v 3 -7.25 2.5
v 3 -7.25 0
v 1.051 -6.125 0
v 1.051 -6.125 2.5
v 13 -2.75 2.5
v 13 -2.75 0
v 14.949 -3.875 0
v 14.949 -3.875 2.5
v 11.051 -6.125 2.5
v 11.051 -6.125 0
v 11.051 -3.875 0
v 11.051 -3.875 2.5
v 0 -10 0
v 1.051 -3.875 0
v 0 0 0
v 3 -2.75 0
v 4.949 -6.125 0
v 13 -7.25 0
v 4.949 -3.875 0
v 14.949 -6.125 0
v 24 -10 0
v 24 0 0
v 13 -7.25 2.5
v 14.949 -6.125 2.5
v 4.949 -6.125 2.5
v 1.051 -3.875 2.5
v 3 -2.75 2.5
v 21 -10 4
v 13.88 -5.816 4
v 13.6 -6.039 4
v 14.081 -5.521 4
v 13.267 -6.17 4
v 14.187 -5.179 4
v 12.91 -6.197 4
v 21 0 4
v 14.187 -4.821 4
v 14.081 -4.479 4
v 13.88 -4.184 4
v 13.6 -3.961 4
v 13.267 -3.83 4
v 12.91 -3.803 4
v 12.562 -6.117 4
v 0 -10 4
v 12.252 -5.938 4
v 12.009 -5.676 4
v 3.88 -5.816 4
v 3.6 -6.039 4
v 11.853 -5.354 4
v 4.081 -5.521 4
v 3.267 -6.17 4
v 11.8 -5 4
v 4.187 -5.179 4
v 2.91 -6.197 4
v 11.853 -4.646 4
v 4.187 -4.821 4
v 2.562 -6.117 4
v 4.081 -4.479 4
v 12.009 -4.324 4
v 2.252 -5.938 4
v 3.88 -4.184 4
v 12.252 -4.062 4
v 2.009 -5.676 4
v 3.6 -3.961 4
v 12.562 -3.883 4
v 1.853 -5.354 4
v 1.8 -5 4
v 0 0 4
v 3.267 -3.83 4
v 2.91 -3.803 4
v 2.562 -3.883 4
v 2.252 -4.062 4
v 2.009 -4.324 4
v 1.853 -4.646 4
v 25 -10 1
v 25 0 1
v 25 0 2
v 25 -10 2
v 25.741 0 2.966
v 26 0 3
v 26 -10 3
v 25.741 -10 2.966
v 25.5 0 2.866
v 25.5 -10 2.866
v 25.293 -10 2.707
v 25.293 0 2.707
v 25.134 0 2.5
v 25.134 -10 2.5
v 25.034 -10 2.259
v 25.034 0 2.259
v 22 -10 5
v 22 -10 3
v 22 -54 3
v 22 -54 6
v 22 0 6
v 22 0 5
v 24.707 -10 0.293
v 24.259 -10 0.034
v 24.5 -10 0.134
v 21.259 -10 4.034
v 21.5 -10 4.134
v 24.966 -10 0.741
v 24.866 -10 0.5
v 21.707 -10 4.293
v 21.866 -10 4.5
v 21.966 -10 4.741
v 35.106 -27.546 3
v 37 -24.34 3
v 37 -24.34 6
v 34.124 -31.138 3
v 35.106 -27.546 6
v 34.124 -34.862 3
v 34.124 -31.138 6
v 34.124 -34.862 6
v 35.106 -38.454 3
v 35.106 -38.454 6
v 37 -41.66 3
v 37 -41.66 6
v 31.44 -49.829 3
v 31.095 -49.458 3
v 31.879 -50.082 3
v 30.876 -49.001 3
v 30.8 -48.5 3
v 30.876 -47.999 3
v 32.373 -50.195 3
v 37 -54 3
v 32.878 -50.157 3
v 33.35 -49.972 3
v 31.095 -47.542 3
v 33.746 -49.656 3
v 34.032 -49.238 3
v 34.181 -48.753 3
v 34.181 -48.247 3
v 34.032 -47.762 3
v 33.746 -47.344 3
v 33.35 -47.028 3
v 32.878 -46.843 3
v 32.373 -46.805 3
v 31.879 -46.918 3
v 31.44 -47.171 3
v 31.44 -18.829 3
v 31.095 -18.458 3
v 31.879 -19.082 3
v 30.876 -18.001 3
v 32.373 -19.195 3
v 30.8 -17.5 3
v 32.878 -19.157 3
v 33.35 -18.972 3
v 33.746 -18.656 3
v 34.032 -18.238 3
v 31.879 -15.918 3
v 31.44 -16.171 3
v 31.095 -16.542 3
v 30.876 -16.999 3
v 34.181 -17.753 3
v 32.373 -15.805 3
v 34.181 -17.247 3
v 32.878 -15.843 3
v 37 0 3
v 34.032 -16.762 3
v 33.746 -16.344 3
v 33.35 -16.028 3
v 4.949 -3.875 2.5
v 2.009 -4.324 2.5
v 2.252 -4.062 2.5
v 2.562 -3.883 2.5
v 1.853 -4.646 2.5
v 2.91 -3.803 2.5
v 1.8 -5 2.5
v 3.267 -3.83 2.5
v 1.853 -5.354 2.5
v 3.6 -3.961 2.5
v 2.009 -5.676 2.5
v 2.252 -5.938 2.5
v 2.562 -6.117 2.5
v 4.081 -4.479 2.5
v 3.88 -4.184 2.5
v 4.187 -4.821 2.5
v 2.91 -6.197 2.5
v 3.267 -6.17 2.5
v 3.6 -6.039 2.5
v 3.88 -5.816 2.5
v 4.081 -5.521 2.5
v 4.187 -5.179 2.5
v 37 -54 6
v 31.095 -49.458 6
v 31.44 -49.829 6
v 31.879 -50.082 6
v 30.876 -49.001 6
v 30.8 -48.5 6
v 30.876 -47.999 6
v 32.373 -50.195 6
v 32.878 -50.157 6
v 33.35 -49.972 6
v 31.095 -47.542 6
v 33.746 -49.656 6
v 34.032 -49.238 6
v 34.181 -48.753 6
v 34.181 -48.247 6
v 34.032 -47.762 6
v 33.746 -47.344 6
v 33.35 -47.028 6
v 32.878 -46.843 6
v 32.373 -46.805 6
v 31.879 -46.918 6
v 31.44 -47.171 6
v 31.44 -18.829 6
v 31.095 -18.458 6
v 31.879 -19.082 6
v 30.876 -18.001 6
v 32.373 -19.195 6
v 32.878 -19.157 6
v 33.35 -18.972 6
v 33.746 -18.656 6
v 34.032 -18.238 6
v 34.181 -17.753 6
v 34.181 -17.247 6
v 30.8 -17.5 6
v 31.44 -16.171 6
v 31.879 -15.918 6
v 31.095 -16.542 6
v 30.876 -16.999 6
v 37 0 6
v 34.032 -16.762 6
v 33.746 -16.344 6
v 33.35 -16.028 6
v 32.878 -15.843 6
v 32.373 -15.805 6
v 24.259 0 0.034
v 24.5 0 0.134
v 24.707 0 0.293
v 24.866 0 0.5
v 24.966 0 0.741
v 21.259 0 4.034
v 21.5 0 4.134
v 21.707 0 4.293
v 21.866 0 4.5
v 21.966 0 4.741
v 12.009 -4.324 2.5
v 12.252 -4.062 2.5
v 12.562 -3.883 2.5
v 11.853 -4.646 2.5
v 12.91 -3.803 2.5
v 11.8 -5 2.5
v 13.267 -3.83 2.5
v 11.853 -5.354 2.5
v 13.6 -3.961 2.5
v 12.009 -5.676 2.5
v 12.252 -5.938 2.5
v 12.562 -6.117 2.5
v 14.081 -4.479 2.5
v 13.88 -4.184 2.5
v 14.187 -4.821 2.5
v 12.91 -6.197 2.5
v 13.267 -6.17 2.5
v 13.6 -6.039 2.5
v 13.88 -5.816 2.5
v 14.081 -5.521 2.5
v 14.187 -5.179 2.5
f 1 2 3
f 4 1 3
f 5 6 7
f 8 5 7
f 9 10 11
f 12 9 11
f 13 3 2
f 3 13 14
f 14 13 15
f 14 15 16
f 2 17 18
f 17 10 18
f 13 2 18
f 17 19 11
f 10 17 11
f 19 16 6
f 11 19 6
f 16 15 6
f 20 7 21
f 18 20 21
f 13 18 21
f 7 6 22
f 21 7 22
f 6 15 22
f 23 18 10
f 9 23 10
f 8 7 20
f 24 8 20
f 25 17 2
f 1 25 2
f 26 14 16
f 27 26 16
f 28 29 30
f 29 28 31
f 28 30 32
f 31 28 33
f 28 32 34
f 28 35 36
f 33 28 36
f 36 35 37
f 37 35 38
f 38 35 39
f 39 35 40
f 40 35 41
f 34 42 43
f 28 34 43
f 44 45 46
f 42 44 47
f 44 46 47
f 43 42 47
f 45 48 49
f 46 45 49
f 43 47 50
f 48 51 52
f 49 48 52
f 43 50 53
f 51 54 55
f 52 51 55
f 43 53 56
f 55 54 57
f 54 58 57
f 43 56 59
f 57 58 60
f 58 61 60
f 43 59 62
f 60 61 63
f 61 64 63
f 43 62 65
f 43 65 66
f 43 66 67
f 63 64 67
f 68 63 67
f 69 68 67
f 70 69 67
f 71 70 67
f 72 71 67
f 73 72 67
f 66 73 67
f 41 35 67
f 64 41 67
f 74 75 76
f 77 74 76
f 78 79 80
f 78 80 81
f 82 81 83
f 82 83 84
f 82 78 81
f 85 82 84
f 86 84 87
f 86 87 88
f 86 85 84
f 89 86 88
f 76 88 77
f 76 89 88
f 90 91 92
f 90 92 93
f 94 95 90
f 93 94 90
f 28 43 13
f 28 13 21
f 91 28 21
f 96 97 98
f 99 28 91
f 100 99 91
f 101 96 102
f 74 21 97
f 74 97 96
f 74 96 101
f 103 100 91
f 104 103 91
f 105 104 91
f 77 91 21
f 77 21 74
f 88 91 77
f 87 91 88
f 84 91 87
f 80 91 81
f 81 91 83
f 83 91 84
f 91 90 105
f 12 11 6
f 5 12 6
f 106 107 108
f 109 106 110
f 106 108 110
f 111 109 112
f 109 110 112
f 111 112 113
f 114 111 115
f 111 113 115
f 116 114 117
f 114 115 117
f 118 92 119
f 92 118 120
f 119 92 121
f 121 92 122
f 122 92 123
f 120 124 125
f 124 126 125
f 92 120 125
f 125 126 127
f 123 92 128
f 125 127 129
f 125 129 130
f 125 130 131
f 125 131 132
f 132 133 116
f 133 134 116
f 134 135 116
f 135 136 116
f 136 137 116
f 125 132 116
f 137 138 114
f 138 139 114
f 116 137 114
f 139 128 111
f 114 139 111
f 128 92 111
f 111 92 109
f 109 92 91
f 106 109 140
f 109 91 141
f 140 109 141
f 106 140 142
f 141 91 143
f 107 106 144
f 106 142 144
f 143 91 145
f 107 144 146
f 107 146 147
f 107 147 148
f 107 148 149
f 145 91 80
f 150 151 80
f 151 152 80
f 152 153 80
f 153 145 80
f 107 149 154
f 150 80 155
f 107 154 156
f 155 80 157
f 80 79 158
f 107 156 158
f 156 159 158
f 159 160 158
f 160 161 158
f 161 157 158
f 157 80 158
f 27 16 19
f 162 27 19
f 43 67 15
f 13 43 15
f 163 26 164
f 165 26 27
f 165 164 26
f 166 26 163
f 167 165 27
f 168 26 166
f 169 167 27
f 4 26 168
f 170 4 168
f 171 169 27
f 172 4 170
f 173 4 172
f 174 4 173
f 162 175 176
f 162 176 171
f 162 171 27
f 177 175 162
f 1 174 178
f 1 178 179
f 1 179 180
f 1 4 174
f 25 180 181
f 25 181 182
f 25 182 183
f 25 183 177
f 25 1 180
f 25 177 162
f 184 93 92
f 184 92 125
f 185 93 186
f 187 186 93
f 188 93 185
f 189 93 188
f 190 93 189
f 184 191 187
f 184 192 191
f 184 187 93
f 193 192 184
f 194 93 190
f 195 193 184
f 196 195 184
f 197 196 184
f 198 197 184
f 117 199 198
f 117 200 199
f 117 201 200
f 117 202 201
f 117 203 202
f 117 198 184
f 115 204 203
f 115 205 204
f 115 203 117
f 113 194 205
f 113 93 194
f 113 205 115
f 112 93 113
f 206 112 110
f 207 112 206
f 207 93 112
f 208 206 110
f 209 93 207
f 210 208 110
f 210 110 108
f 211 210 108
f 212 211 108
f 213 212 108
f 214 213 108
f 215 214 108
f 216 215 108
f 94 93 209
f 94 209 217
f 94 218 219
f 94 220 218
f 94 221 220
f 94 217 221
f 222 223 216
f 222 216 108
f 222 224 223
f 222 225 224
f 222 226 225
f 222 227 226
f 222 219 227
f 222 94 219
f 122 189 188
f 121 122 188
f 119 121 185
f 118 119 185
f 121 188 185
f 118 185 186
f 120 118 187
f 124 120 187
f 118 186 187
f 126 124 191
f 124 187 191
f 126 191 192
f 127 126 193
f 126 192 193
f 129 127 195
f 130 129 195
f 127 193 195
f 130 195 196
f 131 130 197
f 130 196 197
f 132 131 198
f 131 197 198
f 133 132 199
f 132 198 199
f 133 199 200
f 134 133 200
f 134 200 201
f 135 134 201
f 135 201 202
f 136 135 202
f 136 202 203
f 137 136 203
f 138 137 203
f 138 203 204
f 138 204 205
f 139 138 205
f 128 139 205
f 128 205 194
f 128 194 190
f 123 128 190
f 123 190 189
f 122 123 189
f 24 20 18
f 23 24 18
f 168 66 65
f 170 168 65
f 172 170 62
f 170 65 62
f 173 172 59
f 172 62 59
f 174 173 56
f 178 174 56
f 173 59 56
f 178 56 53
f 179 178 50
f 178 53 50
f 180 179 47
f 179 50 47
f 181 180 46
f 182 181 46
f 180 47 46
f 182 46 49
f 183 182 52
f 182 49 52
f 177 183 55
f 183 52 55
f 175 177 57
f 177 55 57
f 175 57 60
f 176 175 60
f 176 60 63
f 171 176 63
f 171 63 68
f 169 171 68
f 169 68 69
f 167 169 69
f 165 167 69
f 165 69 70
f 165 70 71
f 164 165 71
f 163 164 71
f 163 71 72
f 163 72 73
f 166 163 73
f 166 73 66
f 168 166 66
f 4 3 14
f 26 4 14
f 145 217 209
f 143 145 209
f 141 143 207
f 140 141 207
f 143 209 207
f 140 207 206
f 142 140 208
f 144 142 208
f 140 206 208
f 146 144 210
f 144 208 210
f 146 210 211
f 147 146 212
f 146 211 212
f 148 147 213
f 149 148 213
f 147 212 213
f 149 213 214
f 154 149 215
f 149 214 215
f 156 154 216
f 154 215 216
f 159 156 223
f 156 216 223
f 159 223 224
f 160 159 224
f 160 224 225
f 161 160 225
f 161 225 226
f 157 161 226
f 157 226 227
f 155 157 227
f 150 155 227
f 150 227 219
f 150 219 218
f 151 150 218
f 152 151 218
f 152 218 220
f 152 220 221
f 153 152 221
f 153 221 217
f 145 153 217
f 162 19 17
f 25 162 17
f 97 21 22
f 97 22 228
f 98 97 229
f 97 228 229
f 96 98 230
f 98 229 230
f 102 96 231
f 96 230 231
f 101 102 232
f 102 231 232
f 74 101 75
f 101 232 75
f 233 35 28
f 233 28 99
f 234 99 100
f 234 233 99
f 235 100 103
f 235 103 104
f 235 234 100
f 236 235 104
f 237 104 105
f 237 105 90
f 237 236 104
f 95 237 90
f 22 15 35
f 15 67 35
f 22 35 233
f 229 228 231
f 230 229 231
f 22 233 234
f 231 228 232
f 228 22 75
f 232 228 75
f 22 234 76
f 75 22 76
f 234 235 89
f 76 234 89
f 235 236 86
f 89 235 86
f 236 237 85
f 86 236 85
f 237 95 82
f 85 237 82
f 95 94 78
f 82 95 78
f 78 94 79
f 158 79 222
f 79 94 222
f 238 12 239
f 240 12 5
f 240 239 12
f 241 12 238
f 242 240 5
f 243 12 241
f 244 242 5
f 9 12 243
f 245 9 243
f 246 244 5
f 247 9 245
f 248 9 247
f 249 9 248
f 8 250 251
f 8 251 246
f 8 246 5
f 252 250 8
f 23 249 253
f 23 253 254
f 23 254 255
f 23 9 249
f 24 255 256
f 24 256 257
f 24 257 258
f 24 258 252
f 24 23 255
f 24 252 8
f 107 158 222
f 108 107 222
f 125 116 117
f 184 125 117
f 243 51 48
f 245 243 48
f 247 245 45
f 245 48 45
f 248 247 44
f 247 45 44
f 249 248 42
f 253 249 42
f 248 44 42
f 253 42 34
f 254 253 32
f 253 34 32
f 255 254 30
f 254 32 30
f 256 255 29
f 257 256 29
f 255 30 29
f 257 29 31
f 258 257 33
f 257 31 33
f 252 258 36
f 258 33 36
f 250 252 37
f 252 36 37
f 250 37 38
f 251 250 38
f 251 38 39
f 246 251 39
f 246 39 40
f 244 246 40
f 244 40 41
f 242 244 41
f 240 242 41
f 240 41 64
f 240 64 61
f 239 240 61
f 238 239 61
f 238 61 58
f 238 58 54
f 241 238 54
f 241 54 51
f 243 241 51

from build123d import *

# Parameters (mm, degrees)
PAD_DEPTH       = 10
SKETCH001_W     = 15
SKETCH001_H     = 3
PAD001_DEPTH    = 44
SKETCH002_R     = 14
SKETCH002_R_2   = 1.7
POCKET_DEPTH    = 6.001
SKETCH003_R     = 1.2
POCKET001_DEPTH = 5
POCKET002_DEPTH = 2.5


with BuildPart() as part:
    # Sketch → Pad (new body)
    with BuildSketch(Plane.XZ):
        with BuildLine():
            Line((0, 0), (24, 0))
            ThreePointArc((24, 0), (24.707107, 0.292893), (25, 1))
            Line((25, 1), (25, 2))
            ThreePointArc((26, 3), (25.292893, 2.707107), (25, 2))
            Line((26, 3), (37, 3))
            Line((37, 3), (37, 6))
            Line((37, 6), (22, 6))
            Line((22, 6), (22, 5))
            ThreePointArc((21, 4), (21.707107, 4.292893), (22, 5))
            Line((21, 4), (0, 4))
            Line((0, 4), (0, 0))
        make_face()
    extrude(amount=PAD_DEPTH)

    # Sketch001 (on Face13 of Pad) → Pad001 (join)
    with BuildSketch(Plane.XZ.offset(10)):
        with Locations((29.5, 4.5)):
            Rectangle(SKETCH001_W, SKETCH001_H)
    extrude(amount=PAD001_DEPTH)

    # Sketch002 (on Face14 of Pad001) → Pocket (cut, through all)
    with BuildSketch(Plane(origin=(0, 0, 6), x_dir=(-1, 0, 0), z_dir=(0, 0, 1))):
        with Locations((-48, 33)):
            Circle(SKETCH002_R)
        with Locations((-32.5, 48.5)):
            Circle(SKETCH002_R_2)
        with Locations((-32.5, 17.5)):
            Circle(SKETCH002_R_2)
    extrude(amount=-POCKET_DEPTH, mode=Mode.SUBTRACT)

    # Sketch003 (on Face1 of Pocket) → Pocket001 (cut)
    with BuildSketch(Plane(origin=(0, 0, 4), x_dir=(-1, 0, 0), z_dir=(0, 0, 1))):
        with Locations((-3, 5)):
            Circle(SKETCH003_R)
        with Locations((-13, 5)):
            Circle(SKETCH003_R)
    extrude(amount=-POCKET001_DEPTH, mode=Mode.SUBTRACT)

    # Sketch004 (on Face9 of Pocket001) → Pocket002 (cut)
    with BuildSketch(Plane(origin=(0, 0, 0), x_dir=(1, 0, 0), z_dir=(0, 0, -1))):
        Polygon((4.948557, 3.875), (4.948557, 6.125), (3, 7.25), (1.051443, 6.125), (1.051443, 3.875), (3, 2.75), align=None)
        Polygon((13, 2.75), (14.948557, 3.875), (14.948557, 6.125), (13, 7.25), (11.051443, 6.125), (11.051443, 3.875), align=None)
    extrude(amount=-POCKET002_DEPTH, mode=Mode.SUBTRACT)


solid = part.part
